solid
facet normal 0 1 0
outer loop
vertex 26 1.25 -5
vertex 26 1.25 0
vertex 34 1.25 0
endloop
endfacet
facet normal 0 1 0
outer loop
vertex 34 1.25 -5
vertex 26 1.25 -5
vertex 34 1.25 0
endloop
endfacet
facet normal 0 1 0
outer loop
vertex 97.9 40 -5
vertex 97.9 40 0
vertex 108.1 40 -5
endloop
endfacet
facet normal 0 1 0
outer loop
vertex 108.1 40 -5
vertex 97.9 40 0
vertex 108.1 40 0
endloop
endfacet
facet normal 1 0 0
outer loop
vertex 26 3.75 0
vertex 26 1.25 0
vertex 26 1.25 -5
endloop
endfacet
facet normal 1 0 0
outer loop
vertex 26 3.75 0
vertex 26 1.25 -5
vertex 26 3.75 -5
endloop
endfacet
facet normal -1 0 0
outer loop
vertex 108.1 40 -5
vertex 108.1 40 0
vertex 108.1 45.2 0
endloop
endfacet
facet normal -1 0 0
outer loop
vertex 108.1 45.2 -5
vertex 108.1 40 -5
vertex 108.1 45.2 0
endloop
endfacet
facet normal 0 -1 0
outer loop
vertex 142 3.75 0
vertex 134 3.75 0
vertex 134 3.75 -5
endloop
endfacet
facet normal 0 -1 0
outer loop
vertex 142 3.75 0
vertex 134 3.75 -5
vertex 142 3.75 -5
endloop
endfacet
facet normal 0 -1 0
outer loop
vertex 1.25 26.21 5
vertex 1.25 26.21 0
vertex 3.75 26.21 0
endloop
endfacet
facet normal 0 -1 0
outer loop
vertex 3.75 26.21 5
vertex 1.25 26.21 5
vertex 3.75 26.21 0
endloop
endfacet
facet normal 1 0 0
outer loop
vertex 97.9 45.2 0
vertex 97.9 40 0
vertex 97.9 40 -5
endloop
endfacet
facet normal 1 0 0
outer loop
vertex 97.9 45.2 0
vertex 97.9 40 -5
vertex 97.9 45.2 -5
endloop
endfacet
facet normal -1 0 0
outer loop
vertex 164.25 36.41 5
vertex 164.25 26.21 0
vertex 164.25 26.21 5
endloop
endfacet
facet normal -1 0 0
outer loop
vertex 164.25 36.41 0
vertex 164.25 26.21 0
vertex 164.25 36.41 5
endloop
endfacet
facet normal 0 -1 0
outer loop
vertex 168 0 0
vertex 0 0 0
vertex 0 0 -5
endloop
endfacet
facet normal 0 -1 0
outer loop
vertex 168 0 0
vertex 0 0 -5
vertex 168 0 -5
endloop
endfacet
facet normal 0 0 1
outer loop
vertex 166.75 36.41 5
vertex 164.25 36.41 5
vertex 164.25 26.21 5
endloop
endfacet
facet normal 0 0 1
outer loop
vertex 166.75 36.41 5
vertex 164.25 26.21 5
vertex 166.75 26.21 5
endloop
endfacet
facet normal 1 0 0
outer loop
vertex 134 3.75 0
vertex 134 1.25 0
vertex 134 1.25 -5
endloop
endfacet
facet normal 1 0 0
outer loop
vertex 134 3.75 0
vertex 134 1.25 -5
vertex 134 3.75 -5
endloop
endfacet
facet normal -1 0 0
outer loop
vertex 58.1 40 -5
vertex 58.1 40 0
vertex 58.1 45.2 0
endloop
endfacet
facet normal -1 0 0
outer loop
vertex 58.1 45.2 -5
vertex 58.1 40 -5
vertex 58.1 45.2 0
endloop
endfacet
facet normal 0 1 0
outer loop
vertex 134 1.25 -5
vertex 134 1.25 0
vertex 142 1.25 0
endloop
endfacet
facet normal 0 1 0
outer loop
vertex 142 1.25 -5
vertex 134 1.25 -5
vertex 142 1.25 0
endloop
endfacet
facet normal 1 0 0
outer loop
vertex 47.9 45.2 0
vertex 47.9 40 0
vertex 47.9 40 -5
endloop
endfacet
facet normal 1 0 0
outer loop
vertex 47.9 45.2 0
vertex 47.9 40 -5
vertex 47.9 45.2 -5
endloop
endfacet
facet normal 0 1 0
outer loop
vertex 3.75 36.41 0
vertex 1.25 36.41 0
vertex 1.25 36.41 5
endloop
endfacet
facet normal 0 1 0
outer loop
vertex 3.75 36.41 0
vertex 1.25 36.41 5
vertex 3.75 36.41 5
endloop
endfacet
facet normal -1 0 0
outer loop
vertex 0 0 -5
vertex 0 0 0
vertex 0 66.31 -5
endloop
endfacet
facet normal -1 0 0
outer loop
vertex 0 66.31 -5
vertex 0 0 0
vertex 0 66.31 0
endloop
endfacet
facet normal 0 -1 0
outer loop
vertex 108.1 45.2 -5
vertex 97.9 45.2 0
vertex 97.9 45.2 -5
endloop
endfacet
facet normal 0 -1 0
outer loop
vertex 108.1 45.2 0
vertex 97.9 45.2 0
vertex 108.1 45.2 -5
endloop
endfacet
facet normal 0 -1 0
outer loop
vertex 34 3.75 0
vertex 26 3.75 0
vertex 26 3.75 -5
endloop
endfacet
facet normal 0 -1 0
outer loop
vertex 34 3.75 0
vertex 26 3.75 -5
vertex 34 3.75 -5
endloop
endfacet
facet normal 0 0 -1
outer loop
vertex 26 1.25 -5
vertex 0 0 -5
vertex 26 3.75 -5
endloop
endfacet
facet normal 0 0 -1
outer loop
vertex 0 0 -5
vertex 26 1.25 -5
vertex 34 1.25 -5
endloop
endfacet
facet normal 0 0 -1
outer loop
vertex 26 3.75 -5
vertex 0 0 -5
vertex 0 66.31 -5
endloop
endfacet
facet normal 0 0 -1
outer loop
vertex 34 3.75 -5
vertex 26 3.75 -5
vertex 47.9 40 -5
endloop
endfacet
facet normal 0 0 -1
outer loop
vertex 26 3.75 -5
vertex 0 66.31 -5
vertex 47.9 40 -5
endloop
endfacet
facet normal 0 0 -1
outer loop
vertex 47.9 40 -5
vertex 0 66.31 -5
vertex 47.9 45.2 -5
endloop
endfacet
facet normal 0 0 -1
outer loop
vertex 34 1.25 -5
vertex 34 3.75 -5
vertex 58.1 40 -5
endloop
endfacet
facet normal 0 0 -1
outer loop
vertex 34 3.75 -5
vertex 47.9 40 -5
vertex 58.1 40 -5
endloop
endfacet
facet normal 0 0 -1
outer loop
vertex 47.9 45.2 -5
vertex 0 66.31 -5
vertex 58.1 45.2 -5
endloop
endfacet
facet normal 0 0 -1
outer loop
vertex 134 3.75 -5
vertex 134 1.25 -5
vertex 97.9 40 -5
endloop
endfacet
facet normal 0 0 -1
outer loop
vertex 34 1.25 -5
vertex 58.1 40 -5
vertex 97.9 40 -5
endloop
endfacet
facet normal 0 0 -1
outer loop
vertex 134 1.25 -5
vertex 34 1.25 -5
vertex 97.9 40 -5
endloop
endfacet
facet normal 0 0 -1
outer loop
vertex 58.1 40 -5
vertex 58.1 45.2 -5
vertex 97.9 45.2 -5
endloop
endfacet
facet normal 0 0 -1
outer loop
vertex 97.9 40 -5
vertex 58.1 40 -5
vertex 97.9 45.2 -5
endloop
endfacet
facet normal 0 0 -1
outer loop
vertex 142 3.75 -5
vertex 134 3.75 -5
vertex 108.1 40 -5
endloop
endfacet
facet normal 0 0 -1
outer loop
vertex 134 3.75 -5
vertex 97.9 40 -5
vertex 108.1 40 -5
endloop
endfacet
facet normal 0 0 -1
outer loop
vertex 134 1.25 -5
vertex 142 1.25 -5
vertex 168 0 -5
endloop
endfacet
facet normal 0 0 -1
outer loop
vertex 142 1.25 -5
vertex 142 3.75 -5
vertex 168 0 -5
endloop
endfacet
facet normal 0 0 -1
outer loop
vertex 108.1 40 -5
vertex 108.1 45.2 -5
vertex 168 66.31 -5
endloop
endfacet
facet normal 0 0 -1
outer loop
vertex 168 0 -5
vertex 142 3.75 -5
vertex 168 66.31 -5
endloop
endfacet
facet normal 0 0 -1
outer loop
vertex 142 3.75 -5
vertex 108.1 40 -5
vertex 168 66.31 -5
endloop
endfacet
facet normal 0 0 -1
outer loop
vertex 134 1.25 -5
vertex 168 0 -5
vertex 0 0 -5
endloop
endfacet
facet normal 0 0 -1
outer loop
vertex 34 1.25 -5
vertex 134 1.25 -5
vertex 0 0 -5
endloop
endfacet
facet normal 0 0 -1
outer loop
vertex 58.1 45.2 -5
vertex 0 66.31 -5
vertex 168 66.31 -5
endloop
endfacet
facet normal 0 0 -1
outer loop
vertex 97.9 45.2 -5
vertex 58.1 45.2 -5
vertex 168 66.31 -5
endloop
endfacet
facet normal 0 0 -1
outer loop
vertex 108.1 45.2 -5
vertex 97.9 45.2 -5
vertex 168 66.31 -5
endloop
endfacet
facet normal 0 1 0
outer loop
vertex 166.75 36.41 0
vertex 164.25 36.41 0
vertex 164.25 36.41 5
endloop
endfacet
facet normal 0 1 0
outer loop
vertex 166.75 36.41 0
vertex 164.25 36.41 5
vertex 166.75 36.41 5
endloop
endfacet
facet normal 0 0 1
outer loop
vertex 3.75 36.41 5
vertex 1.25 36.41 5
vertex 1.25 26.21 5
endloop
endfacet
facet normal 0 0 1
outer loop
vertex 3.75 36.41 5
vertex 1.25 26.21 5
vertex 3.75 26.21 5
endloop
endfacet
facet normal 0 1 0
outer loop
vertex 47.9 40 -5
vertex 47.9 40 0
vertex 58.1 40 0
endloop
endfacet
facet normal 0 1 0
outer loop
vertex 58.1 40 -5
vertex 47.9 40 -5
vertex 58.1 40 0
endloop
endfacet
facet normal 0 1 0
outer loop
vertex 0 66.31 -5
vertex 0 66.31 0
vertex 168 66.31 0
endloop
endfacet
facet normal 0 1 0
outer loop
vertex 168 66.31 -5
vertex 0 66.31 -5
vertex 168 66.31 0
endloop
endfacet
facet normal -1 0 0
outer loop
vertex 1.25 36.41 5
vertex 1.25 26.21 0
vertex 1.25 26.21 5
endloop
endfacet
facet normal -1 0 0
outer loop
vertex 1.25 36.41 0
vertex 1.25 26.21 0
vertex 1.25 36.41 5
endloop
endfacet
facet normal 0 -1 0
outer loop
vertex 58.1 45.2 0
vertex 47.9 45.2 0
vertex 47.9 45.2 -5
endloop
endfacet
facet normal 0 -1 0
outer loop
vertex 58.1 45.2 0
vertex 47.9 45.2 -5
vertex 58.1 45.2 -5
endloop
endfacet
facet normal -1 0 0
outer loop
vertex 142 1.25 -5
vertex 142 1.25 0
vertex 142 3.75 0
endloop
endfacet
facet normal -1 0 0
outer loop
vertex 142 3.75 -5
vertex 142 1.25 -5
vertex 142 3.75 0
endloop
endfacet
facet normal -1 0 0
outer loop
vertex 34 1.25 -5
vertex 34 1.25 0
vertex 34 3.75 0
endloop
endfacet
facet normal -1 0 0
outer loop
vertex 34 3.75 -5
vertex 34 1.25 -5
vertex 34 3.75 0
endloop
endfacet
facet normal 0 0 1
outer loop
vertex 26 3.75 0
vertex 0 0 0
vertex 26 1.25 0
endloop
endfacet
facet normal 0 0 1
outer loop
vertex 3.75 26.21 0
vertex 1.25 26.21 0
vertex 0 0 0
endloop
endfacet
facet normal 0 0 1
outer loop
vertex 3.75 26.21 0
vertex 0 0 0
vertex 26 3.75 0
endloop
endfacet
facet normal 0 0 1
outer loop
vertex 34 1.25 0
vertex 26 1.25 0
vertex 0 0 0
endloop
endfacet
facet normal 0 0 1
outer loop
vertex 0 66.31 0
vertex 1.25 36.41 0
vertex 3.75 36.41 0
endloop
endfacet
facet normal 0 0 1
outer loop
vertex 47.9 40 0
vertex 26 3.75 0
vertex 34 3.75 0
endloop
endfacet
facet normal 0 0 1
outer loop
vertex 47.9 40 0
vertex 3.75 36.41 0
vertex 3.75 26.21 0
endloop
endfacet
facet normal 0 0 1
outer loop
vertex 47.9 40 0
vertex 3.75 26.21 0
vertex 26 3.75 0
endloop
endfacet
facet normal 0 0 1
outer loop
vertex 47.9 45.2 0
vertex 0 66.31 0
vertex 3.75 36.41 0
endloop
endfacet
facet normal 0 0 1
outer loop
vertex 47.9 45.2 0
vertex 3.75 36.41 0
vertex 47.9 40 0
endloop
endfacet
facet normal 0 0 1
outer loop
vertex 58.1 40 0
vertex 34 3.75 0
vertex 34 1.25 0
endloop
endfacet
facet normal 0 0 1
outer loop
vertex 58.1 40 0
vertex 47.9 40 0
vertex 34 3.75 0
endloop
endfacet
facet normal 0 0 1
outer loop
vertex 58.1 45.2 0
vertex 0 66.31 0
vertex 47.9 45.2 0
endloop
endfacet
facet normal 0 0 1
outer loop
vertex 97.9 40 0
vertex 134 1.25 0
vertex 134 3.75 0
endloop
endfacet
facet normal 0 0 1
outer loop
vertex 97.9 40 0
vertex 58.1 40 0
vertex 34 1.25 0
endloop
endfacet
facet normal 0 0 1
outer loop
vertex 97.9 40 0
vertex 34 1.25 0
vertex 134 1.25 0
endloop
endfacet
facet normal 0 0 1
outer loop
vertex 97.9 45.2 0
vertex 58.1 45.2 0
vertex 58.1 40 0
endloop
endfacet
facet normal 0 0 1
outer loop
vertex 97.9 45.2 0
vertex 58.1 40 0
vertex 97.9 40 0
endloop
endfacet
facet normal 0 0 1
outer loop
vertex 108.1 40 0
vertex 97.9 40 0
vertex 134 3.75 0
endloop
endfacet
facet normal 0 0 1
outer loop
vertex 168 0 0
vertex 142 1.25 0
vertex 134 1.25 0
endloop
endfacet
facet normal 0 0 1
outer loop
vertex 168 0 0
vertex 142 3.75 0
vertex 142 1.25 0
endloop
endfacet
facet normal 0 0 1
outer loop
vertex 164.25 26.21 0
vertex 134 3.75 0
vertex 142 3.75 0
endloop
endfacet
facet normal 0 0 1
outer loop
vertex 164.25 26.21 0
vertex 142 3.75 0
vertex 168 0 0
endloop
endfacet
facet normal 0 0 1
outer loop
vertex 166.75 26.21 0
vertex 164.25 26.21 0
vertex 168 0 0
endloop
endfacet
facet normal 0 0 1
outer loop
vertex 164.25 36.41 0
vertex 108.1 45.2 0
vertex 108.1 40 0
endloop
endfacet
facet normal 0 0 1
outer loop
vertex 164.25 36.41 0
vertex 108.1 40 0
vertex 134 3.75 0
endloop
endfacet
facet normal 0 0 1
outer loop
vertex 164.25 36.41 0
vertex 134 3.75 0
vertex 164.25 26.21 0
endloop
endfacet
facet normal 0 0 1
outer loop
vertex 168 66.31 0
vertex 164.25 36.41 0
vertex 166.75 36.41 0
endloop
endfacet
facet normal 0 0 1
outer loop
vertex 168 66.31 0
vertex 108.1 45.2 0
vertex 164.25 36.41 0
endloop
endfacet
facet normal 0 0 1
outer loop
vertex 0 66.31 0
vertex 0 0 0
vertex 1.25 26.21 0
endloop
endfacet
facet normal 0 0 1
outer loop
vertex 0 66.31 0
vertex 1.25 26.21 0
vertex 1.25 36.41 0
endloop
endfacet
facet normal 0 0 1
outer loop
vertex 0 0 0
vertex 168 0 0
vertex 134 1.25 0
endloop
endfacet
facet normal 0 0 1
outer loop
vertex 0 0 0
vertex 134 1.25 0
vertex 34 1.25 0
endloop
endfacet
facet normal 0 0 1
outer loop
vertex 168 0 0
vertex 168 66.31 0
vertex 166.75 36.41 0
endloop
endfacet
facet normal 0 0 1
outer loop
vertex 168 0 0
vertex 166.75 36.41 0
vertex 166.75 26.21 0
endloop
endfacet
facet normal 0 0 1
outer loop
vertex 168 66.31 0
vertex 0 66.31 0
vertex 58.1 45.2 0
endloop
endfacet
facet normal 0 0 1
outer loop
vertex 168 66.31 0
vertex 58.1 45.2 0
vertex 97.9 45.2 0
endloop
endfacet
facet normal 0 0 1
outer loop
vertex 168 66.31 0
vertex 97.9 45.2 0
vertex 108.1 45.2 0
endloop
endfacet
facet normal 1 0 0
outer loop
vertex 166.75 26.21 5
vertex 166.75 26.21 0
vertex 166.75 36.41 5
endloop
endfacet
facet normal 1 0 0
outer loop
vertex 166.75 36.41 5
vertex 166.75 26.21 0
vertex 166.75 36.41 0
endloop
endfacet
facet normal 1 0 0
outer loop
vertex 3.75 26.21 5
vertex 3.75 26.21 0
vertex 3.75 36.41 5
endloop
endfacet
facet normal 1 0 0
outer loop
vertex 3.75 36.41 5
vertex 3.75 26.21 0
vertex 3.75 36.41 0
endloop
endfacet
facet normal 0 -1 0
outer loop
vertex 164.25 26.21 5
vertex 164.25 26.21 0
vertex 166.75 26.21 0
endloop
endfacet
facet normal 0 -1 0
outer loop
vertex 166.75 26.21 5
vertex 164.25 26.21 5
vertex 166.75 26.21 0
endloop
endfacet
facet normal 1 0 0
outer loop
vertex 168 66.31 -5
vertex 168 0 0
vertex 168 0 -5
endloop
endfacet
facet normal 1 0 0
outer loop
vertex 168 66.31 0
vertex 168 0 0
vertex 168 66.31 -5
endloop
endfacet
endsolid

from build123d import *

# Parameters (mm, degrees)
CROQUIS2_W              = 168
CROQUIS2_H              = 66.31
SALIENTE_EXTRUIR1_DEPTH = 5
CROQUIS3_W              = 2.5
CROQUIS3_H              = 10.2
SALIENTE_EXTRUIR3_DEPTH = 5
CROQUIS5_W              = 10.2
CROQUIS5_H              = 5.2
CORTAR_EXTRUIR2_DEPTH   = 181.68208572
CROQUIS7_W              = 8
CROQUIS7_H              = 2.5
CORTAR_EXTRUIR3_DEPTH   = 181.68208572
SKETCH1_W               = 2.5
SKETCH1_H               = 10.2
BOSS_EXTRUDE1_DEPTH     = 5


with BuildPart() as part:
    # Croquis2 → Saliente-Extruir1 (new body)
    with BuildSketch(Plane.XY):
        with Locations((84, 33.155)):
            Rectangle(CROQUIS2_W, CROQUIS2_H)
    extrude(amount=-SALIENTE_EXTRUIR1_DEPTH)

    # Croquis3 → Saliente-Extruir3 (add)
    with BuildSketch(Plane.XY):
        with Locations((2.5, 31.31)):
            Rectangle(CROQUIS3_W, CROQUIS3_H)
    extrude(amount=SALIENTE_EXTRUIR3_DEPTH)

    # Croquis5 → Cortar-Extruir2 (cut, through all)
    with BuildSketch(Plane.XY):
        with Locations((103, 42.6)):
            Rectangle(CROQUIS5_W, CROQUIS5_H)
        with Locations((53, 42.6)):
            Rectangle(CROQUIS5_W, CROQUIS5_H)
    extrude(amount=-CORTAR_EXTRUIR2_DEPTH, mode=Mode.SUBTRACT)

    # Croquis7 → Cortar-Extruir3 (cut, through all)
    with BuildSketch(Plane.XY):
        with Locations((30, 2.5)):
            Rectangle(CROQUIS7_W, CROQUIS7_H)
        with Locations((138, 2.5)):
            Rectangle(CROQUIS7_W, CROQUIS7_H)
    extrude(amount=-CORTAR_EXTRUIR3_DEPTH, mode=Mode.SUBTRACT)

    # Sketch1 → Boss-Extrude1 (add)
    with BuildSketch(Plane.XY):
        with Locations((165.5, 31.31)):
            Rectangle(SKETCH1_W, SKETCH1_H)
    extrude(amount=BOSS_EXTRUDE1_DEPTH)


solid = part.part
